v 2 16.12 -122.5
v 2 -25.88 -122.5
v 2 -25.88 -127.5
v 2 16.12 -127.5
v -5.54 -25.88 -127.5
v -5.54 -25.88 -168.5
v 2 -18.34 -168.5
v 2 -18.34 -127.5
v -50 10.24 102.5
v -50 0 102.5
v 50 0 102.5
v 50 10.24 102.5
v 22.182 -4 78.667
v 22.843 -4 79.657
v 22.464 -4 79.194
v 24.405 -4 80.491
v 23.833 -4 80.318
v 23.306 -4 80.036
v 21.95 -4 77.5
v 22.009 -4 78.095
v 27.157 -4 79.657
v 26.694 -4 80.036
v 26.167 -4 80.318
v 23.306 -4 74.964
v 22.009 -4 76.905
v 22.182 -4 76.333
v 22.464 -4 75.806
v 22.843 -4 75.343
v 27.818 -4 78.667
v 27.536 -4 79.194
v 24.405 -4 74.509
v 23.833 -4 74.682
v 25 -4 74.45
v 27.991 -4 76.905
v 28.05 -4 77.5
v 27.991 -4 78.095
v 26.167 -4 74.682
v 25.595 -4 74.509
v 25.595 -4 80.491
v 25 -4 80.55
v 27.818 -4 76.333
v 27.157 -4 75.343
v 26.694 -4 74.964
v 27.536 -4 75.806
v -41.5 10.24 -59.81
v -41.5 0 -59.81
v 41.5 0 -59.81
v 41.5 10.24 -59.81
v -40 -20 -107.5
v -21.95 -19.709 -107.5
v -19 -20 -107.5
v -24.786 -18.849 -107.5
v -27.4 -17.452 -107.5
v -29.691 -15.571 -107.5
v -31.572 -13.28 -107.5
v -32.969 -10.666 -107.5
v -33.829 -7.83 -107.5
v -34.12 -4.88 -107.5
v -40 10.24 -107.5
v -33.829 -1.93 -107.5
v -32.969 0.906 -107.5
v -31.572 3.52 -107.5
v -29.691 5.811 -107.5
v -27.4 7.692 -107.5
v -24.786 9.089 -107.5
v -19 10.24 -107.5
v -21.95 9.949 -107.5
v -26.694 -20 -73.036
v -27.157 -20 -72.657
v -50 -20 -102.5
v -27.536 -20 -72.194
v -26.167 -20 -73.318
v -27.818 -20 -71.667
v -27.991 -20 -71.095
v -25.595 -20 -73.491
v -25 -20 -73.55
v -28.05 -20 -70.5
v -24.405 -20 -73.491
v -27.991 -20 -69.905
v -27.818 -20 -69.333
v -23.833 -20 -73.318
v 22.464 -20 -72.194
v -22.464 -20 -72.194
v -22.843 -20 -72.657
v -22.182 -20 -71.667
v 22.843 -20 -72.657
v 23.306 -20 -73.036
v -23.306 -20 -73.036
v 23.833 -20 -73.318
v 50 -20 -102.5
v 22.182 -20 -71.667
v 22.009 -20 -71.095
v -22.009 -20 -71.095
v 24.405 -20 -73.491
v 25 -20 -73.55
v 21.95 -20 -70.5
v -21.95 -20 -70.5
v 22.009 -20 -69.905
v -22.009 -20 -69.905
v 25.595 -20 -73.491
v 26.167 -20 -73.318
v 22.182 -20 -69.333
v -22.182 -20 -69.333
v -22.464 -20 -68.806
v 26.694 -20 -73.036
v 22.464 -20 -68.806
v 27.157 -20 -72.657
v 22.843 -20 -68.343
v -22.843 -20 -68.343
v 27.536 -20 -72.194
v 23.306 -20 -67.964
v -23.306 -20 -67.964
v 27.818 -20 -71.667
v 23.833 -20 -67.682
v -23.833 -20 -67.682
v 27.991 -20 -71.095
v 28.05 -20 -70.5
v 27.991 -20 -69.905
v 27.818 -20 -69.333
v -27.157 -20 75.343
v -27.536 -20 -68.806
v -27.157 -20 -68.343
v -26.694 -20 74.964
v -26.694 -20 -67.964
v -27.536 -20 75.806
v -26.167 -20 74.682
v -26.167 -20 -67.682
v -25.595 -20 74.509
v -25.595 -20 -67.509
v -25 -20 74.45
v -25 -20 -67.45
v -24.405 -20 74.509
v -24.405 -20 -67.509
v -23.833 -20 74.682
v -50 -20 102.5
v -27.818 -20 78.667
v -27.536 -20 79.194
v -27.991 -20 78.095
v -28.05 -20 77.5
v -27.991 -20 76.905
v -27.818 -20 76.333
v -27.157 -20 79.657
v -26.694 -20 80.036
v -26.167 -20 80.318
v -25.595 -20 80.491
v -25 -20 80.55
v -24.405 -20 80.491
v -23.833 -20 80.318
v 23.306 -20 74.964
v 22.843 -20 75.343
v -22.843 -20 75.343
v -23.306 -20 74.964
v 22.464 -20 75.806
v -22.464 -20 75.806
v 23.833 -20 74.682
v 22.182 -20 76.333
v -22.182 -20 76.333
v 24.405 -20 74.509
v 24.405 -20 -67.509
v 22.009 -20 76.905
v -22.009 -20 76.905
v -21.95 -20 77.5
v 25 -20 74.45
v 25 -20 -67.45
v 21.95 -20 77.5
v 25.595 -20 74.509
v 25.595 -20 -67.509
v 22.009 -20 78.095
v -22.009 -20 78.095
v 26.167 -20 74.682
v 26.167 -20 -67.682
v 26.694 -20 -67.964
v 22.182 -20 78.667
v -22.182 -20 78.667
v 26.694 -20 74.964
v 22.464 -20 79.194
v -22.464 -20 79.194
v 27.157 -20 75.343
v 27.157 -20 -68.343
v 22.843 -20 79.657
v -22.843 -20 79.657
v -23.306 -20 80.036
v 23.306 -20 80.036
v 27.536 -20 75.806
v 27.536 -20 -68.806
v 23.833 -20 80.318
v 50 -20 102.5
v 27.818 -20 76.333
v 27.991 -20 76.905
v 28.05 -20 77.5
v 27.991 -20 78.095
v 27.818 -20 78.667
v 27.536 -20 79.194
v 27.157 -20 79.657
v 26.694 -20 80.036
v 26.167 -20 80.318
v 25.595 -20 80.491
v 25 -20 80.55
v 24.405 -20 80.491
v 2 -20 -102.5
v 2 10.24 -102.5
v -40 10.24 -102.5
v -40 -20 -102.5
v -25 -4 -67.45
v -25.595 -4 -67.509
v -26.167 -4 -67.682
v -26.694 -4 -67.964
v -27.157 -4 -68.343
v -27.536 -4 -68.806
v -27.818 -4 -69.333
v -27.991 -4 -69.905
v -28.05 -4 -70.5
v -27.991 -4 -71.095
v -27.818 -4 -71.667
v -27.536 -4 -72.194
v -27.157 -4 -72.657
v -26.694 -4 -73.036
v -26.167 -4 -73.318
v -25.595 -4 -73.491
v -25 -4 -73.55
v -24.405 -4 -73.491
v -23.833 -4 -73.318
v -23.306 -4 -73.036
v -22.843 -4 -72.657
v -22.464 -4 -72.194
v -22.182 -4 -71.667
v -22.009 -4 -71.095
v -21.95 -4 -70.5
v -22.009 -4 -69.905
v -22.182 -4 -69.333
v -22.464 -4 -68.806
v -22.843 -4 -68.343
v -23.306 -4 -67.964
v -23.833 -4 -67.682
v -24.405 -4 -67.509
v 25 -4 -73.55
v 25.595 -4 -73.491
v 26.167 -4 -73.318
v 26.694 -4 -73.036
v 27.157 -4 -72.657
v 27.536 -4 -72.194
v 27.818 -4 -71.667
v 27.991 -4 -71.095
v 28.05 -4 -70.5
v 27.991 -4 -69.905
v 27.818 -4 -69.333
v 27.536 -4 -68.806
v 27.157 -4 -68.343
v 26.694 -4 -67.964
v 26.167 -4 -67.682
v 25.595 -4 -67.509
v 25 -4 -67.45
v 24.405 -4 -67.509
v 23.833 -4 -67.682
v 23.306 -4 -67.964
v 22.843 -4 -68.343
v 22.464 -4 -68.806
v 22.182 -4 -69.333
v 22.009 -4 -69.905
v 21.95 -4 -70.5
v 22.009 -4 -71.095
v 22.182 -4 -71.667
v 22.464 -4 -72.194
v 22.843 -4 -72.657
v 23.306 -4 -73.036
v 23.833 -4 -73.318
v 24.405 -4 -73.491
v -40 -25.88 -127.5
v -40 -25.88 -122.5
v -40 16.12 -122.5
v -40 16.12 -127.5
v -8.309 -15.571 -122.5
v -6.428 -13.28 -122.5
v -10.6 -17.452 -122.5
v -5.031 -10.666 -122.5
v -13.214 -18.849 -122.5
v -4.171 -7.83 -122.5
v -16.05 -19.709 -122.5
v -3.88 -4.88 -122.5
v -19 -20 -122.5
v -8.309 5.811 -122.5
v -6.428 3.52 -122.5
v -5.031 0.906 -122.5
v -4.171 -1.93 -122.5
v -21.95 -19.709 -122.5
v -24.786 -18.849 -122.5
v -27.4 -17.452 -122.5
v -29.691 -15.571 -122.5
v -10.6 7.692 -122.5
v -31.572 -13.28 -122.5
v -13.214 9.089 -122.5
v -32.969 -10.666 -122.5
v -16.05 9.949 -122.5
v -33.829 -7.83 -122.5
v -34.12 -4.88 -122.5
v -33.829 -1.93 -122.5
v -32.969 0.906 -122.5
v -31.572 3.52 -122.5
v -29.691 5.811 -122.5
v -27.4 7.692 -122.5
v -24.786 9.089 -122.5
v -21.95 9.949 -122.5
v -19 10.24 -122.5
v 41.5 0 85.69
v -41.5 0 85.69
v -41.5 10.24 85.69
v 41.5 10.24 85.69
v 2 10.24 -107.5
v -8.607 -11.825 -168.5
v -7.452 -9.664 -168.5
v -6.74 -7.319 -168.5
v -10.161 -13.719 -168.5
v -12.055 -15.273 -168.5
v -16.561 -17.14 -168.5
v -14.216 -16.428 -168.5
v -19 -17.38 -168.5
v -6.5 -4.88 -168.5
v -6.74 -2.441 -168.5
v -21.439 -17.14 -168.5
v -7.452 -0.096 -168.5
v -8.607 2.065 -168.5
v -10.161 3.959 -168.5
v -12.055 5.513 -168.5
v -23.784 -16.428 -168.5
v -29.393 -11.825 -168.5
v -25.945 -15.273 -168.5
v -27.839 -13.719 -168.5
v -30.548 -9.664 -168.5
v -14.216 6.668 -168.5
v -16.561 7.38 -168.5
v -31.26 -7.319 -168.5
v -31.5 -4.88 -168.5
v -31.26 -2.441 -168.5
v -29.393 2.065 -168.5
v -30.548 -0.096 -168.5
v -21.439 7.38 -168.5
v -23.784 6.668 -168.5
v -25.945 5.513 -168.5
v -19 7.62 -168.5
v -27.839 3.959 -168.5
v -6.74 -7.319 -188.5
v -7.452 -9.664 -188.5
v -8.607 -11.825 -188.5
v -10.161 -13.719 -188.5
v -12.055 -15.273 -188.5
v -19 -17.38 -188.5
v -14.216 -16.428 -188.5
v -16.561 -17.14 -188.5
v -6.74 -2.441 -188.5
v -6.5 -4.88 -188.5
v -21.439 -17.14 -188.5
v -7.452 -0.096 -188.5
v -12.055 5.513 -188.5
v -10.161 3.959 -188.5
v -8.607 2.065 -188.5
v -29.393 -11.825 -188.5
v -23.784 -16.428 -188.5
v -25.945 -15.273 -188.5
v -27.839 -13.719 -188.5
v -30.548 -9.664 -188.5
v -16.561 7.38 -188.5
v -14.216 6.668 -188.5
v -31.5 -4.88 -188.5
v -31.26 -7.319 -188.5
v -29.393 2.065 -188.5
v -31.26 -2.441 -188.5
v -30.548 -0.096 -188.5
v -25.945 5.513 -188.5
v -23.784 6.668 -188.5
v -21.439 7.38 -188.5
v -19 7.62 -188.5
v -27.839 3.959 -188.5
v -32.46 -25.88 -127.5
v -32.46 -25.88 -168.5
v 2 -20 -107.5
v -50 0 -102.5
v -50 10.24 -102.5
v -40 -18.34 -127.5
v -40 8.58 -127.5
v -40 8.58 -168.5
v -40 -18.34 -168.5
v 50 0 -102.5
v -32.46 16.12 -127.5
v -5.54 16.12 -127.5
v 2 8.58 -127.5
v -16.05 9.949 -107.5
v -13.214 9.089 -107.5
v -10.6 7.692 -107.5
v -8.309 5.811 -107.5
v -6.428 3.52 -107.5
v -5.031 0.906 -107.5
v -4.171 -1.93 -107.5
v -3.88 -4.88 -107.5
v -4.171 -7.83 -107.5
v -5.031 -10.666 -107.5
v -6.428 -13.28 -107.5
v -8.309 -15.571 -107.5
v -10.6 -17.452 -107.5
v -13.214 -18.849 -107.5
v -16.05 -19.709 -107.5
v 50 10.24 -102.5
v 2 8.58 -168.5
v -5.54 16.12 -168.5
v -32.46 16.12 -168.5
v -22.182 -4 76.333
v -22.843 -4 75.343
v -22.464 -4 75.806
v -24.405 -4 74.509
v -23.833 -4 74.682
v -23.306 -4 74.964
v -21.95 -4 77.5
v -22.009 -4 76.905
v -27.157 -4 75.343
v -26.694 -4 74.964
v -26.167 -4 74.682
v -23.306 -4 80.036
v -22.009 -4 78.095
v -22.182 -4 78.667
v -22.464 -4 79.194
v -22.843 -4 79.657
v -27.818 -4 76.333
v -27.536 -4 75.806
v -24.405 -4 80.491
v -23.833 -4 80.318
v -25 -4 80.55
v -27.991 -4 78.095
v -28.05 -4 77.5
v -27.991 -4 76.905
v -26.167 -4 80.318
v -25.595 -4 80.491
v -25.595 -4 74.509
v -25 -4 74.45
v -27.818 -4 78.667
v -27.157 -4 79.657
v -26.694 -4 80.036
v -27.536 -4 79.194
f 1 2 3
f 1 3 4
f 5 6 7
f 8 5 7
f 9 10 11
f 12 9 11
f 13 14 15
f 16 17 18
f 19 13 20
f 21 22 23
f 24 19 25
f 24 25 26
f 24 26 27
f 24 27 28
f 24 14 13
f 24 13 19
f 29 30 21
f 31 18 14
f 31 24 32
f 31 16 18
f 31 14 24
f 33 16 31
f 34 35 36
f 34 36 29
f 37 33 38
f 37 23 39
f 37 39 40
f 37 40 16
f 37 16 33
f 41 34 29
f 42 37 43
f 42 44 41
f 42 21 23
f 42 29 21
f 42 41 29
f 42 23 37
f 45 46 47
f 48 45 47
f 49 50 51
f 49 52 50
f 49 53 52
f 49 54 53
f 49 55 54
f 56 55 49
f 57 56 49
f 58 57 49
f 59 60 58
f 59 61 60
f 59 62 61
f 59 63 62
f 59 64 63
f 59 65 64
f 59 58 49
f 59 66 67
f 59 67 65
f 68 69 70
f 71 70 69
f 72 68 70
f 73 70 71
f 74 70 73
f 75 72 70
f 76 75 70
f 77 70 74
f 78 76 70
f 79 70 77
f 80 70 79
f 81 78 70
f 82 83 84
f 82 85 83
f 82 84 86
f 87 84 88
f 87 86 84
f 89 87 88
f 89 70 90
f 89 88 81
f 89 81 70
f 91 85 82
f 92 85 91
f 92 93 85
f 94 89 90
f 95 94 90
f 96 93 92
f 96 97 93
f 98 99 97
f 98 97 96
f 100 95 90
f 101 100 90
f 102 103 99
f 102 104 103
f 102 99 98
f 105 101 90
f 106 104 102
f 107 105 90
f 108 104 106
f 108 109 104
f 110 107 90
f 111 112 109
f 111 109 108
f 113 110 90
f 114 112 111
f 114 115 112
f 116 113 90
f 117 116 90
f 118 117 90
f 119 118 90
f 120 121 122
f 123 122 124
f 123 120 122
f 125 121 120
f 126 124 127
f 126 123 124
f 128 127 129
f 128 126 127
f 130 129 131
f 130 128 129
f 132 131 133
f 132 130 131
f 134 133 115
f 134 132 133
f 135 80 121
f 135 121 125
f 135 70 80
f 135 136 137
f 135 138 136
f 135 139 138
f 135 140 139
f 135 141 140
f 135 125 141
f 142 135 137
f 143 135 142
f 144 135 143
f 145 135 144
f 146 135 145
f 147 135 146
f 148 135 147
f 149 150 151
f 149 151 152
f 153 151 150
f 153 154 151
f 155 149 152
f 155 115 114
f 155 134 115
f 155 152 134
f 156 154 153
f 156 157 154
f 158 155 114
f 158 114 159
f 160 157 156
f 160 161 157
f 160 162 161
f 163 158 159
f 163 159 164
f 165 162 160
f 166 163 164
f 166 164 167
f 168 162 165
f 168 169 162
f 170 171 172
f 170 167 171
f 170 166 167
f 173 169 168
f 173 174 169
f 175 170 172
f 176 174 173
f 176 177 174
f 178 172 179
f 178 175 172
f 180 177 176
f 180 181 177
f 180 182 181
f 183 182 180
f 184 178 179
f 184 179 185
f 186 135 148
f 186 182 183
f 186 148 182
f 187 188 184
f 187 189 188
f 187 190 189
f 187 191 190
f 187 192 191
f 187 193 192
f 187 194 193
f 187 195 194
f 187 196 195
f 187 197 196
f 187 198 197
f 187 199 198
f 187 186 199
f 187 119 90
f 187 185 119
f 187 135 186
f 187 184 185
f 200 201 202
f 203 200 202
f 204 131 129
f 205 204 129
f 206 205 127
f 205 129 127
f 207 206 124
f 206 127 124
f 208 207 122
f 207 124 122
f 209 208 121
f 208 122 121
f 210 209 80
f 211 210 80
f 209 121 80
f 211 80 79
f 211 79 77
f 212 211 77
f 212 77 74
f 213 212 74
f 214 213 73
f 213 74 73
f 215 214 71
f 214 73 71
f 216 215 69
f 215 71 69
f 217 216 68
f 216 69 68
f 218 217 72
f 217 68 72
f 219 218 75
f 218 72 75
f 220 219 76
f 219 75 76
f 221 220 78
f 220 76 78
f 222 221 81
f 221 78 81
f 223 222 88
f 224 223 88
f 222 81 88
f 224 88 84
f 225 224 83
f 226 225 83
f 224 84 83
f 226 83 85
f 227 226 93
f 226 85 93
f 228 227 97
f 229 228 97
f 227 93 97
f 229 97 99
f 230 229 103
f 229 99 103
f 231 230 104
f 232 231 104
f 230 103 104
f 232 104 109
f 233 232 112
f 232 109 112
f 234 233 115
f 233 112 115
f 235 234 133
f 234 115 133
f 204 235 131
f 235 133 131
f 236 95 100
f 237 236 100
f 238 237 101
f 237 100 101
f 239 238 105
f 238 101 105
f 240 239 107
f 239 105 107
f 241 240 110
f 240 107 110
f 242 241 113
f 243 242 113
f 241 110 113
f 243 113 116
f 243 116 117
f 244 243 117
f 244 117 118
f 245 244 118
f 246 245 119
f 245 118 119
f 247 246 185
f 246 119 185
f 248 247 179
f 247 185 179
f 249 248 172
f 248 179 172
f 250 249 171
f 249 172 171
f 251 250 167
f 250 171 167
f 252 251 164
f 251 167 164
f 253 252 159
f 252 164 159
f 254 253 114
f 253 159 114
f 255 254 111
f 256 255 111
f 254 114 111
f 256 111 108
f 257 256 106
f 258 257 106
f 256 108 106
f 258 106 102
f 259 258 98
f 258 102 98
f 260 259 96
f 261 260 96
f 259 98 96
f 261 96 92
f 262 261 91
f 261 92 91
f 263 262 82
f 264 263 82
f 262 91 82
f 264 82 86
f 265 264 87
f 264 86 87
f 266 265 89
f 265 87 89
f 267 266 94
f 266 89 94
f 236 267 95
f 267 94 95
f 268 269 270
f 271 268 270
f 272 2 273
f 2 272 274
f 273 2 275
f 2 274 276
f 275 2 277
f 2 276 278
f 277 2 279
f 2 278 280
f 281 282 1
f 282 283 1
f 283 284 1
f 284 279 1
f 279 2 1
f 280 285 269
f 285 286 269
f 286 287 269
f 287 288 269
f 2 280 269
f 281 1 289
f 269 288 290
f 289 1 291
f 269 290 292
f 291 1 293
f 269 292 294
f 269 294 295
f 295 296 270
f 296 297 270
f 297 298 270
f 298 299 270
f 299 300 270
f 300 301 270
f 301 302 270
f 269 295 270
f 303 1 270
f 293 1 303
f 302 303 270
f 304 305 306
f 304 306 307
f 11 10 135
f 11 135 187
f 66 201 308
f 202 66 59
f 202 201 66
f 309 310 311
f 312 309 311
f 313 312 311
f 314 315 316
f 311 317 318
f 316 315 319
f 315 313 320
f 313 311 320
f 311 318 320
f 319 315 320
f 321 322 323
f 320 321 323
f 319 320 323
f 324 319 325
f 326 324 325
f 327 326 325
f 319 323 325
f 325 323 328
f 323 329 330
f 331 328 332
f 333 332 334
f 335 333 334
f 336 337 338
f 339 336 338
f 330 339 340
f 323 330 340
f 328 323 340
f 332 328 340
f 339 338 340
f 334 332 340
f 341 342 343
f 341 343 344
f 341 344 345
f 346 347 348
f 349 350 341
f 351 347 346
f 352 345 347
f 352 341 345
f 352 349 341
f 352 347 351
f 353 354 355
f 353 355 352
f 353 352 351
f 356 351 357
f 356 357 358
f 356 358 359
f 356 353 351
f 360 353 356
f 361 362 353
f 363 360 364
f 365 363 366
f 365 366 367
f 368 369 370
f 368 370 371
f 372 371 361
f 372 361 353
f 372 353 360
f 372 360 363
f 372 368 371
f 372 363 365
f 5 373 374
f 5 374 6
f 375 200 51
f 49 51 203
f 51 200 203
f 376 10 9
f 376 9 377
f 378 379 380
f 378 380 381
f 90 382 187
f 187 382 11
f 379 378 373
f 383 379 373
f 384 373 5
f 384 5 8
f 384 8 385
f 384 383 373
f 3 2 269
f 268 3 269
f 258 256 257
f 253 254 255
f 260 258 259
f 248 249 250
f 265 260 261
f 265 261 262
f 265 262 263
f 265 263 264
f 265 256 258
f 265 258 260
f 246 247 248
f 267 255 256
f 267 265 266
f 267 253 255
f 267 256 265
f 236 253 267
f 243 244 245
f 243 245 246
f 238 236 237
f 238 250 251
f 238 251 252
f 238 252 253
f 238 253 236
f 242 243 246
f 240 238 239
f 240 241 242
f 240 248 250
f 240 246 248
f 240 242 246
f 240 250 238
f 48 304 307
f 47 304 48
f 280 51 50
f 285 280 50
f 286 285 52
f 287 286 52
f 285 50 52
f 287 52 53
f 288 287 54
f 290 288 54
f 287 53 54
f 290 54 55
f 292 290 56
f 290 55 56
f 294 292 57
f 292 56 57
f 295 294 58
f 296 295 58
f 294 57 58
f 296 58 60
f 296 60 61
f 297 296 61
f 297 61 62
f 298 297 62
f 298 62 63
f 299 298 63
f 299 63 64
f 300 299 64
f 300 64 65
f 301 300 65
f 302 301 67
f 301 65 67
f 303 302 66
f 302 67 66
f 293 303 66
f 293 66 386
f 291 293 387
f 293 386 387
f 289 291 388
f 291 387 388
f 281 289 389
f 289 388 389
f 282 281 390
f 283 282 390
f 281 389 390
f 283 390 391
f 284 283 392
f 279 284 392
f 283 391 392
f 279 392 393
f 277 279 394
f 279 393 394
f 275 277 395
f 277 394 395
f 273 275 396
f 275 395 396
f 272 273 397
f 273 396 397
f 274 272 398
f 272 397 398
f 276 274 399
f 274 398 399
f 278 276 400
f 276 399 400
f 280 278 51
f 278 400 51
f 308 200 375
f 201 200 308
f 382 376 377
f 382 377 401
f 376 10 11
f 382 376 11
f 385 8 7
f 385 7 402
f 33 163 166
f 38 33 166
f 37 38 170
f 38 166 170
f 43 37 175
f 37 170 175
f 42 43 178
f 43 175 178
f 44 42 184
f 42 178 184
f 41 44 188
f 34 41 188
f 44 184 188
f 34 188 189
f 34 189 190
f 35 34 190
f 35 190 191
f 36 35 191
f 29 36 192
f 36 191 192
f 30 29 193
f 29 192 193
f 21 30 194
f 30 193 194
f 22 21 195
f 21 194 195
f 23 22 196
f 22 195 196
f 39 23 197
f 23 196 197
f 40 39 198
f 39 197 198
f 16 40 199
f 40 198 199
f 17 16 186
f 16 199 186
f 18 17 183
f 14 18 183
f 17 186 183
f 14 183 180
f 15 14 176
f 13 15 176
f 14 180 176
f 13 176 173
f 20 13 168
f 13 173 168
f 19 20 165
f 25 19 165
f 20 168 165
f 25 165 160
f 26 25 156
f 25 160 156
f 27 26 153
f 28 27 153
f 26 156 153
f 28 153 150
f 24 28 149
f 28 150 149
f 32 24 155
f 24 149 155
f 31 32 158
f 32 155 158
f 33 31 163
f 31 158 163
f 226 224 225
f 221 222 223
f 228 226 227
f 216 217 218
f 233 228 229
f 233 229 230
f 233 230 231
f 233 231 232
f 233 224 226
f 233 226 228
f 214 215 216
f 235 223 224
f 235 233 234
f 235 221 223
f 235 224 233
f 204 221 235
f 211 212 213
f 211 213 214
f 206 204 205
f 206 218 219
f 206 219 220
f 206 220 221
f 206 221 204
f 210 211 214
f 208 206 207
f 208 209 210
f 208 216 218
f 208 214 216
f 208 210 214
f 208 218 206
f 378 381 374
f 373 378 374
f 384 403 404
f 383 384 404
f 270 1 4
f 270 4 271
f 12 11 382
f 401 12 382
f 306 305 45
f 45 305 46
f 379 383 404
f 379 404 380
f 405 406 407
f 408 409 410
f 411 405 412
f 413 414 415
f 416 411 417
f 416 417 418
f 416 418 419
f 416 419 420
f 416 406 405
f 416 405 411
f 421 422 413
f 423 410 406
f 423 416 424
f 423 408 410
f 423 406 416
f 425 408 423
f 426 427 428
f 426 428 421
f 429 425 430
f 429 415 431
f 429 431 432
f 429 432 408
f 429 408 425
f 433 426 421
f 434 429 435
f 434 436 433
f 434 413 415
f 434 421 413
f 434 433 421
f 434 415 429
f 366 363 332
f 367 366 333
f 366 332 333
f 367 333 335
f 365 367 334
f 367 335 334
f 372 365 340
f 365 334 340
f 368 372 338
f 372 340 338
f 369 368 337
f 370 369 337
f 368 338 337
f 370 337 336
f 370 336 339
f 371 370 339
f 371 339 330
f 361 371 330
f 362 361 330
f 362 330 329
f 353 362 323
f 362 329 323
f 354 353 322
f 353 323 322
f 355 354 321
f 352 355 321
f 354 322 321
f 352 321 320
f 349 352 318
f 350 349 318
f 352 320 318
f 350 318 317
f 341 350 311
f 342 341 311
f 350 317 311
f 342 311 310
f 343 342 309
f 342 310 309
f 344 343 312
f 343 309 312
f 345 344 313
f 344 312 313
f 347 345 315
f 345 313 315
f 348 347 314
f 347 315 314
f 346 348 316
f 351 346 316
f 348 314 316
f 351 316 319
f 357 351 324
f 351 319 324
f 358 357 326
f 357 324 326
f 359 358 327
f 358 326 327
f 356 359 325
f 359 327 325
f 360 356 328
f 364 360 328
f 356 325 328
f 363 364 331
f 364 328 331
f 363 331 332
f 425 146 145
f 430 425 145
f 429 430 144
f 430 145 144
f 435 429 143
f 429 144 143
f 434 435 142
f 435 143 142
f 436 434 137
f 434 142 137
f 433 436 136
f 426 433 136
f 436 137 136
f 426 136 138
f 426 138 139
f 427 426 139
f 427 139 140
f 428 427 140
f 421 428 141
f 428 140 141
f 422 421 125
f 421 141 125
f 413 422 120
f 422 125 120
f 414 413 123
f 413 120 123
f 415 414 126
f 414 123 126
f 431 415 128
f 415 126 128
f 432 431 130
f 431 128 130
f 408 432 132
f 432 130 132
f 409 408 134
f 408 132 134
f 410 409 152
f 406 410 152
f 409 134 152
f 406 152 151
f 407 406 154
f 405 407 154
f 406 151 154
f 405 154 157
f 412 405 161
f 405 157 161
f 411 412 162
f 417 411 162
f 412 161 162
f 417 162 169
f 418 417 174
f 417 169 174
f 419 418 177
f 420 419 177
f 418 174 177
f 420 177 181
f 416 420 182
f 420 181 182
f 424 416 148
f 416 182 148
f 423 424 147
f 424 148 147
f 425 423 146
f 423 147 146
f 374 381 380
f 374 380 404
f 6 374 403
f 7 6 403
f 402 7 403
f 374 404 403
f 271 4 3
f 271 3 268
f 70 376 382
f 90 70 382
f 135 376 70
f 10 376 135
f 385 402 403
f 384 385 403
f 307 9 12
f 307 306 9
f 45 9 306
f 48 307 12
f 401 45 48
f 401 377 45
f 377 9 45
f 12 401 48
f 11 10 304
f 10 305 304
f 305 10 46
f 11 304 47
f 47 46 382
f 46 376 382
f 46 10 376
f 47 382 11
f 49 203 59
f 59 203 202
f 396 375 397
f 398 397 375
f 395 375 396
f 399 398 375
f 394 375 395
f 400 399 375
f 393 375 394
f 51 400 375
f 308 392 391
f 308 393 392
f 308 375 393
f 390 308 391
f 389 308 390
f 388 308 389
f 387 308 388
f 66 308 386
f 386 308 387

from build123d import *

# Parameters (mm, degrees)
SKETCH1_W           = 100
SKETCH1_H           = 205
SKETCH1_W_2         = 83
SKETCH1_H_2         = 145.5
BOSS_EXTRUDE1_DEPTH = 10.24
SKETCH2_W           = 100
SKETCH2_H           = 205
BOSS_EXTRUDE2_DEPTH = 20
SKETCH6_W           = 42
SKETCH6_H           = 30.24
BOSS_EXTRUDE4_DEPTH = 5
SKETCH7_R           = 15.12
BOSS_EXTRUDE5_DEPTH = 15
SKETCH8_W           = 42
SKETCH8_H           = 42
BOSS_EXTRUDE6_DEPTH = 5
BOSS_EXTRUDE7_DEPTH = 41
SKETCH10_R          = 12.5
BOSS_EXTRUDE8_DEPTH = 20
SKETCH12_R          = 3.05
CUT_EXTRUDE2_DEPTH  = 16


with BuildPart() as part:
    # Sketch1 → Boss-Extrude1 (new body)
    with BuildSketch(Plane(origin=(0, 0, 0), x_dir=(1, 0, 0), z_dir=(0, 1, 0))):
        Rectangle(SKETCH1_W, SKETCH1_H)
        with Locations((0, -12.94)):
            Rectangle(SKETCH1_W_2, SKETCH1_H_2, mode=Mode.SUBTRACT)
    extrude(amount=BOSS_EXTRUDE1_DEPTH)


with BuildPart() as body_2:
    # Sketch2 → Boss-Extrude2 (new body)
    with BuildSketch(Plane.XZ):
        Rectangle(SKETCH2_W, SKETCH2_H)
    extrude(amount=BOSS_EXTRUDE2_DEPTH)

    # Sketch12 → Cut-Extrude2 (cut)
    with BuildSketch(Plane.XZ.offset(20)):
        with Locations((25, 77.5)):
            Circle(SKETCH12_R)
        with Locations((25, -70.5)):
            Circle(SKETCH12_R)
        with Locations((-25, -70.5)):
            Circle(SKETCH12_R)
        with Locations((-25, 77.5)):
            Circle(SKETCH12_R)
    extrude(amount=-CUT_EXTRUDE2_DEPTH, mode=Mode.SUBTRACT)


with BuildPart() as body_3:
    # Sketch6 → Boss-Extrude4 (new body)
    with BuildSketch(Plane(origin=(0, 0, -102.5), x_dir=(-1, 0, 0), z_dir=(0, 0, -1))):
        with Locations((19, -4.88)):
            Rectangle(SKETCH6_W, SKETCH6_H)
    extrude(amount=BOSS_EXTRUDE4_DEPTH)

    # Sketch7 → Boss-Extrude5 (add)
    with BuildSketch(Plane(origin=(0, 0, -107.5), x_dir=(-1, 0, 0), z_dir=(0, 0, -1))):
        with Locations((19, -4.88)):
            Circle(SKETCH7_R)
    extrude(amount=BOSS_EXTRUDE5_DEPTH)

    # Sketch8 → Boss-Extrude6 (add)
    with BuildSketch(Plane(origin=(0, 0, -122.5), x_dir=(-1, 0, 0), z_dir=(0, 0, -1))):
        with Locations((19, -4.88)):
            Rectangle(SKETCH8_W, SKETCH8_H)
    extrude(amount=BOSS_EXTRUDE6_DEPTH)


with BuildPart() as body_4:
    # Sketch9 → Boss-Extrude7 (new body)
    with BuildSketch(Plane(origin=(0, 0, -127.5), x_dir=(-1, 0, 0), z_dir=(0, 0, -1))):
        Polygon((40, -18.340331321), (32.460331321, -25.88), (5.539668679, -25.88), (-2, -18.340331321), (-2, 8.580331321), (5.539668679, 16.12), (32.460331321, 16.12), (40, 8.580331321), align=None)
    extrude(amount=BOSS_EXTRUDE7_DEPTH)


with BuildPart() as body_5:
    # Sketch10 → Boss-Extrude8 (new body)
    with BuildSketch(Plane(origin=(0, 0, -168.5), x_dir=(-1, 0, 0), z_dir=(0, 0, -1))):
        with Locations((19, -4.88)):
            Circle(SKETCH10_R)
    extrude(amount=BOSS_EXTRUDE8_DEPTH)


solid = Compound([part.part, body_2.part, body_3.part, body_4.part, body_5.part])
